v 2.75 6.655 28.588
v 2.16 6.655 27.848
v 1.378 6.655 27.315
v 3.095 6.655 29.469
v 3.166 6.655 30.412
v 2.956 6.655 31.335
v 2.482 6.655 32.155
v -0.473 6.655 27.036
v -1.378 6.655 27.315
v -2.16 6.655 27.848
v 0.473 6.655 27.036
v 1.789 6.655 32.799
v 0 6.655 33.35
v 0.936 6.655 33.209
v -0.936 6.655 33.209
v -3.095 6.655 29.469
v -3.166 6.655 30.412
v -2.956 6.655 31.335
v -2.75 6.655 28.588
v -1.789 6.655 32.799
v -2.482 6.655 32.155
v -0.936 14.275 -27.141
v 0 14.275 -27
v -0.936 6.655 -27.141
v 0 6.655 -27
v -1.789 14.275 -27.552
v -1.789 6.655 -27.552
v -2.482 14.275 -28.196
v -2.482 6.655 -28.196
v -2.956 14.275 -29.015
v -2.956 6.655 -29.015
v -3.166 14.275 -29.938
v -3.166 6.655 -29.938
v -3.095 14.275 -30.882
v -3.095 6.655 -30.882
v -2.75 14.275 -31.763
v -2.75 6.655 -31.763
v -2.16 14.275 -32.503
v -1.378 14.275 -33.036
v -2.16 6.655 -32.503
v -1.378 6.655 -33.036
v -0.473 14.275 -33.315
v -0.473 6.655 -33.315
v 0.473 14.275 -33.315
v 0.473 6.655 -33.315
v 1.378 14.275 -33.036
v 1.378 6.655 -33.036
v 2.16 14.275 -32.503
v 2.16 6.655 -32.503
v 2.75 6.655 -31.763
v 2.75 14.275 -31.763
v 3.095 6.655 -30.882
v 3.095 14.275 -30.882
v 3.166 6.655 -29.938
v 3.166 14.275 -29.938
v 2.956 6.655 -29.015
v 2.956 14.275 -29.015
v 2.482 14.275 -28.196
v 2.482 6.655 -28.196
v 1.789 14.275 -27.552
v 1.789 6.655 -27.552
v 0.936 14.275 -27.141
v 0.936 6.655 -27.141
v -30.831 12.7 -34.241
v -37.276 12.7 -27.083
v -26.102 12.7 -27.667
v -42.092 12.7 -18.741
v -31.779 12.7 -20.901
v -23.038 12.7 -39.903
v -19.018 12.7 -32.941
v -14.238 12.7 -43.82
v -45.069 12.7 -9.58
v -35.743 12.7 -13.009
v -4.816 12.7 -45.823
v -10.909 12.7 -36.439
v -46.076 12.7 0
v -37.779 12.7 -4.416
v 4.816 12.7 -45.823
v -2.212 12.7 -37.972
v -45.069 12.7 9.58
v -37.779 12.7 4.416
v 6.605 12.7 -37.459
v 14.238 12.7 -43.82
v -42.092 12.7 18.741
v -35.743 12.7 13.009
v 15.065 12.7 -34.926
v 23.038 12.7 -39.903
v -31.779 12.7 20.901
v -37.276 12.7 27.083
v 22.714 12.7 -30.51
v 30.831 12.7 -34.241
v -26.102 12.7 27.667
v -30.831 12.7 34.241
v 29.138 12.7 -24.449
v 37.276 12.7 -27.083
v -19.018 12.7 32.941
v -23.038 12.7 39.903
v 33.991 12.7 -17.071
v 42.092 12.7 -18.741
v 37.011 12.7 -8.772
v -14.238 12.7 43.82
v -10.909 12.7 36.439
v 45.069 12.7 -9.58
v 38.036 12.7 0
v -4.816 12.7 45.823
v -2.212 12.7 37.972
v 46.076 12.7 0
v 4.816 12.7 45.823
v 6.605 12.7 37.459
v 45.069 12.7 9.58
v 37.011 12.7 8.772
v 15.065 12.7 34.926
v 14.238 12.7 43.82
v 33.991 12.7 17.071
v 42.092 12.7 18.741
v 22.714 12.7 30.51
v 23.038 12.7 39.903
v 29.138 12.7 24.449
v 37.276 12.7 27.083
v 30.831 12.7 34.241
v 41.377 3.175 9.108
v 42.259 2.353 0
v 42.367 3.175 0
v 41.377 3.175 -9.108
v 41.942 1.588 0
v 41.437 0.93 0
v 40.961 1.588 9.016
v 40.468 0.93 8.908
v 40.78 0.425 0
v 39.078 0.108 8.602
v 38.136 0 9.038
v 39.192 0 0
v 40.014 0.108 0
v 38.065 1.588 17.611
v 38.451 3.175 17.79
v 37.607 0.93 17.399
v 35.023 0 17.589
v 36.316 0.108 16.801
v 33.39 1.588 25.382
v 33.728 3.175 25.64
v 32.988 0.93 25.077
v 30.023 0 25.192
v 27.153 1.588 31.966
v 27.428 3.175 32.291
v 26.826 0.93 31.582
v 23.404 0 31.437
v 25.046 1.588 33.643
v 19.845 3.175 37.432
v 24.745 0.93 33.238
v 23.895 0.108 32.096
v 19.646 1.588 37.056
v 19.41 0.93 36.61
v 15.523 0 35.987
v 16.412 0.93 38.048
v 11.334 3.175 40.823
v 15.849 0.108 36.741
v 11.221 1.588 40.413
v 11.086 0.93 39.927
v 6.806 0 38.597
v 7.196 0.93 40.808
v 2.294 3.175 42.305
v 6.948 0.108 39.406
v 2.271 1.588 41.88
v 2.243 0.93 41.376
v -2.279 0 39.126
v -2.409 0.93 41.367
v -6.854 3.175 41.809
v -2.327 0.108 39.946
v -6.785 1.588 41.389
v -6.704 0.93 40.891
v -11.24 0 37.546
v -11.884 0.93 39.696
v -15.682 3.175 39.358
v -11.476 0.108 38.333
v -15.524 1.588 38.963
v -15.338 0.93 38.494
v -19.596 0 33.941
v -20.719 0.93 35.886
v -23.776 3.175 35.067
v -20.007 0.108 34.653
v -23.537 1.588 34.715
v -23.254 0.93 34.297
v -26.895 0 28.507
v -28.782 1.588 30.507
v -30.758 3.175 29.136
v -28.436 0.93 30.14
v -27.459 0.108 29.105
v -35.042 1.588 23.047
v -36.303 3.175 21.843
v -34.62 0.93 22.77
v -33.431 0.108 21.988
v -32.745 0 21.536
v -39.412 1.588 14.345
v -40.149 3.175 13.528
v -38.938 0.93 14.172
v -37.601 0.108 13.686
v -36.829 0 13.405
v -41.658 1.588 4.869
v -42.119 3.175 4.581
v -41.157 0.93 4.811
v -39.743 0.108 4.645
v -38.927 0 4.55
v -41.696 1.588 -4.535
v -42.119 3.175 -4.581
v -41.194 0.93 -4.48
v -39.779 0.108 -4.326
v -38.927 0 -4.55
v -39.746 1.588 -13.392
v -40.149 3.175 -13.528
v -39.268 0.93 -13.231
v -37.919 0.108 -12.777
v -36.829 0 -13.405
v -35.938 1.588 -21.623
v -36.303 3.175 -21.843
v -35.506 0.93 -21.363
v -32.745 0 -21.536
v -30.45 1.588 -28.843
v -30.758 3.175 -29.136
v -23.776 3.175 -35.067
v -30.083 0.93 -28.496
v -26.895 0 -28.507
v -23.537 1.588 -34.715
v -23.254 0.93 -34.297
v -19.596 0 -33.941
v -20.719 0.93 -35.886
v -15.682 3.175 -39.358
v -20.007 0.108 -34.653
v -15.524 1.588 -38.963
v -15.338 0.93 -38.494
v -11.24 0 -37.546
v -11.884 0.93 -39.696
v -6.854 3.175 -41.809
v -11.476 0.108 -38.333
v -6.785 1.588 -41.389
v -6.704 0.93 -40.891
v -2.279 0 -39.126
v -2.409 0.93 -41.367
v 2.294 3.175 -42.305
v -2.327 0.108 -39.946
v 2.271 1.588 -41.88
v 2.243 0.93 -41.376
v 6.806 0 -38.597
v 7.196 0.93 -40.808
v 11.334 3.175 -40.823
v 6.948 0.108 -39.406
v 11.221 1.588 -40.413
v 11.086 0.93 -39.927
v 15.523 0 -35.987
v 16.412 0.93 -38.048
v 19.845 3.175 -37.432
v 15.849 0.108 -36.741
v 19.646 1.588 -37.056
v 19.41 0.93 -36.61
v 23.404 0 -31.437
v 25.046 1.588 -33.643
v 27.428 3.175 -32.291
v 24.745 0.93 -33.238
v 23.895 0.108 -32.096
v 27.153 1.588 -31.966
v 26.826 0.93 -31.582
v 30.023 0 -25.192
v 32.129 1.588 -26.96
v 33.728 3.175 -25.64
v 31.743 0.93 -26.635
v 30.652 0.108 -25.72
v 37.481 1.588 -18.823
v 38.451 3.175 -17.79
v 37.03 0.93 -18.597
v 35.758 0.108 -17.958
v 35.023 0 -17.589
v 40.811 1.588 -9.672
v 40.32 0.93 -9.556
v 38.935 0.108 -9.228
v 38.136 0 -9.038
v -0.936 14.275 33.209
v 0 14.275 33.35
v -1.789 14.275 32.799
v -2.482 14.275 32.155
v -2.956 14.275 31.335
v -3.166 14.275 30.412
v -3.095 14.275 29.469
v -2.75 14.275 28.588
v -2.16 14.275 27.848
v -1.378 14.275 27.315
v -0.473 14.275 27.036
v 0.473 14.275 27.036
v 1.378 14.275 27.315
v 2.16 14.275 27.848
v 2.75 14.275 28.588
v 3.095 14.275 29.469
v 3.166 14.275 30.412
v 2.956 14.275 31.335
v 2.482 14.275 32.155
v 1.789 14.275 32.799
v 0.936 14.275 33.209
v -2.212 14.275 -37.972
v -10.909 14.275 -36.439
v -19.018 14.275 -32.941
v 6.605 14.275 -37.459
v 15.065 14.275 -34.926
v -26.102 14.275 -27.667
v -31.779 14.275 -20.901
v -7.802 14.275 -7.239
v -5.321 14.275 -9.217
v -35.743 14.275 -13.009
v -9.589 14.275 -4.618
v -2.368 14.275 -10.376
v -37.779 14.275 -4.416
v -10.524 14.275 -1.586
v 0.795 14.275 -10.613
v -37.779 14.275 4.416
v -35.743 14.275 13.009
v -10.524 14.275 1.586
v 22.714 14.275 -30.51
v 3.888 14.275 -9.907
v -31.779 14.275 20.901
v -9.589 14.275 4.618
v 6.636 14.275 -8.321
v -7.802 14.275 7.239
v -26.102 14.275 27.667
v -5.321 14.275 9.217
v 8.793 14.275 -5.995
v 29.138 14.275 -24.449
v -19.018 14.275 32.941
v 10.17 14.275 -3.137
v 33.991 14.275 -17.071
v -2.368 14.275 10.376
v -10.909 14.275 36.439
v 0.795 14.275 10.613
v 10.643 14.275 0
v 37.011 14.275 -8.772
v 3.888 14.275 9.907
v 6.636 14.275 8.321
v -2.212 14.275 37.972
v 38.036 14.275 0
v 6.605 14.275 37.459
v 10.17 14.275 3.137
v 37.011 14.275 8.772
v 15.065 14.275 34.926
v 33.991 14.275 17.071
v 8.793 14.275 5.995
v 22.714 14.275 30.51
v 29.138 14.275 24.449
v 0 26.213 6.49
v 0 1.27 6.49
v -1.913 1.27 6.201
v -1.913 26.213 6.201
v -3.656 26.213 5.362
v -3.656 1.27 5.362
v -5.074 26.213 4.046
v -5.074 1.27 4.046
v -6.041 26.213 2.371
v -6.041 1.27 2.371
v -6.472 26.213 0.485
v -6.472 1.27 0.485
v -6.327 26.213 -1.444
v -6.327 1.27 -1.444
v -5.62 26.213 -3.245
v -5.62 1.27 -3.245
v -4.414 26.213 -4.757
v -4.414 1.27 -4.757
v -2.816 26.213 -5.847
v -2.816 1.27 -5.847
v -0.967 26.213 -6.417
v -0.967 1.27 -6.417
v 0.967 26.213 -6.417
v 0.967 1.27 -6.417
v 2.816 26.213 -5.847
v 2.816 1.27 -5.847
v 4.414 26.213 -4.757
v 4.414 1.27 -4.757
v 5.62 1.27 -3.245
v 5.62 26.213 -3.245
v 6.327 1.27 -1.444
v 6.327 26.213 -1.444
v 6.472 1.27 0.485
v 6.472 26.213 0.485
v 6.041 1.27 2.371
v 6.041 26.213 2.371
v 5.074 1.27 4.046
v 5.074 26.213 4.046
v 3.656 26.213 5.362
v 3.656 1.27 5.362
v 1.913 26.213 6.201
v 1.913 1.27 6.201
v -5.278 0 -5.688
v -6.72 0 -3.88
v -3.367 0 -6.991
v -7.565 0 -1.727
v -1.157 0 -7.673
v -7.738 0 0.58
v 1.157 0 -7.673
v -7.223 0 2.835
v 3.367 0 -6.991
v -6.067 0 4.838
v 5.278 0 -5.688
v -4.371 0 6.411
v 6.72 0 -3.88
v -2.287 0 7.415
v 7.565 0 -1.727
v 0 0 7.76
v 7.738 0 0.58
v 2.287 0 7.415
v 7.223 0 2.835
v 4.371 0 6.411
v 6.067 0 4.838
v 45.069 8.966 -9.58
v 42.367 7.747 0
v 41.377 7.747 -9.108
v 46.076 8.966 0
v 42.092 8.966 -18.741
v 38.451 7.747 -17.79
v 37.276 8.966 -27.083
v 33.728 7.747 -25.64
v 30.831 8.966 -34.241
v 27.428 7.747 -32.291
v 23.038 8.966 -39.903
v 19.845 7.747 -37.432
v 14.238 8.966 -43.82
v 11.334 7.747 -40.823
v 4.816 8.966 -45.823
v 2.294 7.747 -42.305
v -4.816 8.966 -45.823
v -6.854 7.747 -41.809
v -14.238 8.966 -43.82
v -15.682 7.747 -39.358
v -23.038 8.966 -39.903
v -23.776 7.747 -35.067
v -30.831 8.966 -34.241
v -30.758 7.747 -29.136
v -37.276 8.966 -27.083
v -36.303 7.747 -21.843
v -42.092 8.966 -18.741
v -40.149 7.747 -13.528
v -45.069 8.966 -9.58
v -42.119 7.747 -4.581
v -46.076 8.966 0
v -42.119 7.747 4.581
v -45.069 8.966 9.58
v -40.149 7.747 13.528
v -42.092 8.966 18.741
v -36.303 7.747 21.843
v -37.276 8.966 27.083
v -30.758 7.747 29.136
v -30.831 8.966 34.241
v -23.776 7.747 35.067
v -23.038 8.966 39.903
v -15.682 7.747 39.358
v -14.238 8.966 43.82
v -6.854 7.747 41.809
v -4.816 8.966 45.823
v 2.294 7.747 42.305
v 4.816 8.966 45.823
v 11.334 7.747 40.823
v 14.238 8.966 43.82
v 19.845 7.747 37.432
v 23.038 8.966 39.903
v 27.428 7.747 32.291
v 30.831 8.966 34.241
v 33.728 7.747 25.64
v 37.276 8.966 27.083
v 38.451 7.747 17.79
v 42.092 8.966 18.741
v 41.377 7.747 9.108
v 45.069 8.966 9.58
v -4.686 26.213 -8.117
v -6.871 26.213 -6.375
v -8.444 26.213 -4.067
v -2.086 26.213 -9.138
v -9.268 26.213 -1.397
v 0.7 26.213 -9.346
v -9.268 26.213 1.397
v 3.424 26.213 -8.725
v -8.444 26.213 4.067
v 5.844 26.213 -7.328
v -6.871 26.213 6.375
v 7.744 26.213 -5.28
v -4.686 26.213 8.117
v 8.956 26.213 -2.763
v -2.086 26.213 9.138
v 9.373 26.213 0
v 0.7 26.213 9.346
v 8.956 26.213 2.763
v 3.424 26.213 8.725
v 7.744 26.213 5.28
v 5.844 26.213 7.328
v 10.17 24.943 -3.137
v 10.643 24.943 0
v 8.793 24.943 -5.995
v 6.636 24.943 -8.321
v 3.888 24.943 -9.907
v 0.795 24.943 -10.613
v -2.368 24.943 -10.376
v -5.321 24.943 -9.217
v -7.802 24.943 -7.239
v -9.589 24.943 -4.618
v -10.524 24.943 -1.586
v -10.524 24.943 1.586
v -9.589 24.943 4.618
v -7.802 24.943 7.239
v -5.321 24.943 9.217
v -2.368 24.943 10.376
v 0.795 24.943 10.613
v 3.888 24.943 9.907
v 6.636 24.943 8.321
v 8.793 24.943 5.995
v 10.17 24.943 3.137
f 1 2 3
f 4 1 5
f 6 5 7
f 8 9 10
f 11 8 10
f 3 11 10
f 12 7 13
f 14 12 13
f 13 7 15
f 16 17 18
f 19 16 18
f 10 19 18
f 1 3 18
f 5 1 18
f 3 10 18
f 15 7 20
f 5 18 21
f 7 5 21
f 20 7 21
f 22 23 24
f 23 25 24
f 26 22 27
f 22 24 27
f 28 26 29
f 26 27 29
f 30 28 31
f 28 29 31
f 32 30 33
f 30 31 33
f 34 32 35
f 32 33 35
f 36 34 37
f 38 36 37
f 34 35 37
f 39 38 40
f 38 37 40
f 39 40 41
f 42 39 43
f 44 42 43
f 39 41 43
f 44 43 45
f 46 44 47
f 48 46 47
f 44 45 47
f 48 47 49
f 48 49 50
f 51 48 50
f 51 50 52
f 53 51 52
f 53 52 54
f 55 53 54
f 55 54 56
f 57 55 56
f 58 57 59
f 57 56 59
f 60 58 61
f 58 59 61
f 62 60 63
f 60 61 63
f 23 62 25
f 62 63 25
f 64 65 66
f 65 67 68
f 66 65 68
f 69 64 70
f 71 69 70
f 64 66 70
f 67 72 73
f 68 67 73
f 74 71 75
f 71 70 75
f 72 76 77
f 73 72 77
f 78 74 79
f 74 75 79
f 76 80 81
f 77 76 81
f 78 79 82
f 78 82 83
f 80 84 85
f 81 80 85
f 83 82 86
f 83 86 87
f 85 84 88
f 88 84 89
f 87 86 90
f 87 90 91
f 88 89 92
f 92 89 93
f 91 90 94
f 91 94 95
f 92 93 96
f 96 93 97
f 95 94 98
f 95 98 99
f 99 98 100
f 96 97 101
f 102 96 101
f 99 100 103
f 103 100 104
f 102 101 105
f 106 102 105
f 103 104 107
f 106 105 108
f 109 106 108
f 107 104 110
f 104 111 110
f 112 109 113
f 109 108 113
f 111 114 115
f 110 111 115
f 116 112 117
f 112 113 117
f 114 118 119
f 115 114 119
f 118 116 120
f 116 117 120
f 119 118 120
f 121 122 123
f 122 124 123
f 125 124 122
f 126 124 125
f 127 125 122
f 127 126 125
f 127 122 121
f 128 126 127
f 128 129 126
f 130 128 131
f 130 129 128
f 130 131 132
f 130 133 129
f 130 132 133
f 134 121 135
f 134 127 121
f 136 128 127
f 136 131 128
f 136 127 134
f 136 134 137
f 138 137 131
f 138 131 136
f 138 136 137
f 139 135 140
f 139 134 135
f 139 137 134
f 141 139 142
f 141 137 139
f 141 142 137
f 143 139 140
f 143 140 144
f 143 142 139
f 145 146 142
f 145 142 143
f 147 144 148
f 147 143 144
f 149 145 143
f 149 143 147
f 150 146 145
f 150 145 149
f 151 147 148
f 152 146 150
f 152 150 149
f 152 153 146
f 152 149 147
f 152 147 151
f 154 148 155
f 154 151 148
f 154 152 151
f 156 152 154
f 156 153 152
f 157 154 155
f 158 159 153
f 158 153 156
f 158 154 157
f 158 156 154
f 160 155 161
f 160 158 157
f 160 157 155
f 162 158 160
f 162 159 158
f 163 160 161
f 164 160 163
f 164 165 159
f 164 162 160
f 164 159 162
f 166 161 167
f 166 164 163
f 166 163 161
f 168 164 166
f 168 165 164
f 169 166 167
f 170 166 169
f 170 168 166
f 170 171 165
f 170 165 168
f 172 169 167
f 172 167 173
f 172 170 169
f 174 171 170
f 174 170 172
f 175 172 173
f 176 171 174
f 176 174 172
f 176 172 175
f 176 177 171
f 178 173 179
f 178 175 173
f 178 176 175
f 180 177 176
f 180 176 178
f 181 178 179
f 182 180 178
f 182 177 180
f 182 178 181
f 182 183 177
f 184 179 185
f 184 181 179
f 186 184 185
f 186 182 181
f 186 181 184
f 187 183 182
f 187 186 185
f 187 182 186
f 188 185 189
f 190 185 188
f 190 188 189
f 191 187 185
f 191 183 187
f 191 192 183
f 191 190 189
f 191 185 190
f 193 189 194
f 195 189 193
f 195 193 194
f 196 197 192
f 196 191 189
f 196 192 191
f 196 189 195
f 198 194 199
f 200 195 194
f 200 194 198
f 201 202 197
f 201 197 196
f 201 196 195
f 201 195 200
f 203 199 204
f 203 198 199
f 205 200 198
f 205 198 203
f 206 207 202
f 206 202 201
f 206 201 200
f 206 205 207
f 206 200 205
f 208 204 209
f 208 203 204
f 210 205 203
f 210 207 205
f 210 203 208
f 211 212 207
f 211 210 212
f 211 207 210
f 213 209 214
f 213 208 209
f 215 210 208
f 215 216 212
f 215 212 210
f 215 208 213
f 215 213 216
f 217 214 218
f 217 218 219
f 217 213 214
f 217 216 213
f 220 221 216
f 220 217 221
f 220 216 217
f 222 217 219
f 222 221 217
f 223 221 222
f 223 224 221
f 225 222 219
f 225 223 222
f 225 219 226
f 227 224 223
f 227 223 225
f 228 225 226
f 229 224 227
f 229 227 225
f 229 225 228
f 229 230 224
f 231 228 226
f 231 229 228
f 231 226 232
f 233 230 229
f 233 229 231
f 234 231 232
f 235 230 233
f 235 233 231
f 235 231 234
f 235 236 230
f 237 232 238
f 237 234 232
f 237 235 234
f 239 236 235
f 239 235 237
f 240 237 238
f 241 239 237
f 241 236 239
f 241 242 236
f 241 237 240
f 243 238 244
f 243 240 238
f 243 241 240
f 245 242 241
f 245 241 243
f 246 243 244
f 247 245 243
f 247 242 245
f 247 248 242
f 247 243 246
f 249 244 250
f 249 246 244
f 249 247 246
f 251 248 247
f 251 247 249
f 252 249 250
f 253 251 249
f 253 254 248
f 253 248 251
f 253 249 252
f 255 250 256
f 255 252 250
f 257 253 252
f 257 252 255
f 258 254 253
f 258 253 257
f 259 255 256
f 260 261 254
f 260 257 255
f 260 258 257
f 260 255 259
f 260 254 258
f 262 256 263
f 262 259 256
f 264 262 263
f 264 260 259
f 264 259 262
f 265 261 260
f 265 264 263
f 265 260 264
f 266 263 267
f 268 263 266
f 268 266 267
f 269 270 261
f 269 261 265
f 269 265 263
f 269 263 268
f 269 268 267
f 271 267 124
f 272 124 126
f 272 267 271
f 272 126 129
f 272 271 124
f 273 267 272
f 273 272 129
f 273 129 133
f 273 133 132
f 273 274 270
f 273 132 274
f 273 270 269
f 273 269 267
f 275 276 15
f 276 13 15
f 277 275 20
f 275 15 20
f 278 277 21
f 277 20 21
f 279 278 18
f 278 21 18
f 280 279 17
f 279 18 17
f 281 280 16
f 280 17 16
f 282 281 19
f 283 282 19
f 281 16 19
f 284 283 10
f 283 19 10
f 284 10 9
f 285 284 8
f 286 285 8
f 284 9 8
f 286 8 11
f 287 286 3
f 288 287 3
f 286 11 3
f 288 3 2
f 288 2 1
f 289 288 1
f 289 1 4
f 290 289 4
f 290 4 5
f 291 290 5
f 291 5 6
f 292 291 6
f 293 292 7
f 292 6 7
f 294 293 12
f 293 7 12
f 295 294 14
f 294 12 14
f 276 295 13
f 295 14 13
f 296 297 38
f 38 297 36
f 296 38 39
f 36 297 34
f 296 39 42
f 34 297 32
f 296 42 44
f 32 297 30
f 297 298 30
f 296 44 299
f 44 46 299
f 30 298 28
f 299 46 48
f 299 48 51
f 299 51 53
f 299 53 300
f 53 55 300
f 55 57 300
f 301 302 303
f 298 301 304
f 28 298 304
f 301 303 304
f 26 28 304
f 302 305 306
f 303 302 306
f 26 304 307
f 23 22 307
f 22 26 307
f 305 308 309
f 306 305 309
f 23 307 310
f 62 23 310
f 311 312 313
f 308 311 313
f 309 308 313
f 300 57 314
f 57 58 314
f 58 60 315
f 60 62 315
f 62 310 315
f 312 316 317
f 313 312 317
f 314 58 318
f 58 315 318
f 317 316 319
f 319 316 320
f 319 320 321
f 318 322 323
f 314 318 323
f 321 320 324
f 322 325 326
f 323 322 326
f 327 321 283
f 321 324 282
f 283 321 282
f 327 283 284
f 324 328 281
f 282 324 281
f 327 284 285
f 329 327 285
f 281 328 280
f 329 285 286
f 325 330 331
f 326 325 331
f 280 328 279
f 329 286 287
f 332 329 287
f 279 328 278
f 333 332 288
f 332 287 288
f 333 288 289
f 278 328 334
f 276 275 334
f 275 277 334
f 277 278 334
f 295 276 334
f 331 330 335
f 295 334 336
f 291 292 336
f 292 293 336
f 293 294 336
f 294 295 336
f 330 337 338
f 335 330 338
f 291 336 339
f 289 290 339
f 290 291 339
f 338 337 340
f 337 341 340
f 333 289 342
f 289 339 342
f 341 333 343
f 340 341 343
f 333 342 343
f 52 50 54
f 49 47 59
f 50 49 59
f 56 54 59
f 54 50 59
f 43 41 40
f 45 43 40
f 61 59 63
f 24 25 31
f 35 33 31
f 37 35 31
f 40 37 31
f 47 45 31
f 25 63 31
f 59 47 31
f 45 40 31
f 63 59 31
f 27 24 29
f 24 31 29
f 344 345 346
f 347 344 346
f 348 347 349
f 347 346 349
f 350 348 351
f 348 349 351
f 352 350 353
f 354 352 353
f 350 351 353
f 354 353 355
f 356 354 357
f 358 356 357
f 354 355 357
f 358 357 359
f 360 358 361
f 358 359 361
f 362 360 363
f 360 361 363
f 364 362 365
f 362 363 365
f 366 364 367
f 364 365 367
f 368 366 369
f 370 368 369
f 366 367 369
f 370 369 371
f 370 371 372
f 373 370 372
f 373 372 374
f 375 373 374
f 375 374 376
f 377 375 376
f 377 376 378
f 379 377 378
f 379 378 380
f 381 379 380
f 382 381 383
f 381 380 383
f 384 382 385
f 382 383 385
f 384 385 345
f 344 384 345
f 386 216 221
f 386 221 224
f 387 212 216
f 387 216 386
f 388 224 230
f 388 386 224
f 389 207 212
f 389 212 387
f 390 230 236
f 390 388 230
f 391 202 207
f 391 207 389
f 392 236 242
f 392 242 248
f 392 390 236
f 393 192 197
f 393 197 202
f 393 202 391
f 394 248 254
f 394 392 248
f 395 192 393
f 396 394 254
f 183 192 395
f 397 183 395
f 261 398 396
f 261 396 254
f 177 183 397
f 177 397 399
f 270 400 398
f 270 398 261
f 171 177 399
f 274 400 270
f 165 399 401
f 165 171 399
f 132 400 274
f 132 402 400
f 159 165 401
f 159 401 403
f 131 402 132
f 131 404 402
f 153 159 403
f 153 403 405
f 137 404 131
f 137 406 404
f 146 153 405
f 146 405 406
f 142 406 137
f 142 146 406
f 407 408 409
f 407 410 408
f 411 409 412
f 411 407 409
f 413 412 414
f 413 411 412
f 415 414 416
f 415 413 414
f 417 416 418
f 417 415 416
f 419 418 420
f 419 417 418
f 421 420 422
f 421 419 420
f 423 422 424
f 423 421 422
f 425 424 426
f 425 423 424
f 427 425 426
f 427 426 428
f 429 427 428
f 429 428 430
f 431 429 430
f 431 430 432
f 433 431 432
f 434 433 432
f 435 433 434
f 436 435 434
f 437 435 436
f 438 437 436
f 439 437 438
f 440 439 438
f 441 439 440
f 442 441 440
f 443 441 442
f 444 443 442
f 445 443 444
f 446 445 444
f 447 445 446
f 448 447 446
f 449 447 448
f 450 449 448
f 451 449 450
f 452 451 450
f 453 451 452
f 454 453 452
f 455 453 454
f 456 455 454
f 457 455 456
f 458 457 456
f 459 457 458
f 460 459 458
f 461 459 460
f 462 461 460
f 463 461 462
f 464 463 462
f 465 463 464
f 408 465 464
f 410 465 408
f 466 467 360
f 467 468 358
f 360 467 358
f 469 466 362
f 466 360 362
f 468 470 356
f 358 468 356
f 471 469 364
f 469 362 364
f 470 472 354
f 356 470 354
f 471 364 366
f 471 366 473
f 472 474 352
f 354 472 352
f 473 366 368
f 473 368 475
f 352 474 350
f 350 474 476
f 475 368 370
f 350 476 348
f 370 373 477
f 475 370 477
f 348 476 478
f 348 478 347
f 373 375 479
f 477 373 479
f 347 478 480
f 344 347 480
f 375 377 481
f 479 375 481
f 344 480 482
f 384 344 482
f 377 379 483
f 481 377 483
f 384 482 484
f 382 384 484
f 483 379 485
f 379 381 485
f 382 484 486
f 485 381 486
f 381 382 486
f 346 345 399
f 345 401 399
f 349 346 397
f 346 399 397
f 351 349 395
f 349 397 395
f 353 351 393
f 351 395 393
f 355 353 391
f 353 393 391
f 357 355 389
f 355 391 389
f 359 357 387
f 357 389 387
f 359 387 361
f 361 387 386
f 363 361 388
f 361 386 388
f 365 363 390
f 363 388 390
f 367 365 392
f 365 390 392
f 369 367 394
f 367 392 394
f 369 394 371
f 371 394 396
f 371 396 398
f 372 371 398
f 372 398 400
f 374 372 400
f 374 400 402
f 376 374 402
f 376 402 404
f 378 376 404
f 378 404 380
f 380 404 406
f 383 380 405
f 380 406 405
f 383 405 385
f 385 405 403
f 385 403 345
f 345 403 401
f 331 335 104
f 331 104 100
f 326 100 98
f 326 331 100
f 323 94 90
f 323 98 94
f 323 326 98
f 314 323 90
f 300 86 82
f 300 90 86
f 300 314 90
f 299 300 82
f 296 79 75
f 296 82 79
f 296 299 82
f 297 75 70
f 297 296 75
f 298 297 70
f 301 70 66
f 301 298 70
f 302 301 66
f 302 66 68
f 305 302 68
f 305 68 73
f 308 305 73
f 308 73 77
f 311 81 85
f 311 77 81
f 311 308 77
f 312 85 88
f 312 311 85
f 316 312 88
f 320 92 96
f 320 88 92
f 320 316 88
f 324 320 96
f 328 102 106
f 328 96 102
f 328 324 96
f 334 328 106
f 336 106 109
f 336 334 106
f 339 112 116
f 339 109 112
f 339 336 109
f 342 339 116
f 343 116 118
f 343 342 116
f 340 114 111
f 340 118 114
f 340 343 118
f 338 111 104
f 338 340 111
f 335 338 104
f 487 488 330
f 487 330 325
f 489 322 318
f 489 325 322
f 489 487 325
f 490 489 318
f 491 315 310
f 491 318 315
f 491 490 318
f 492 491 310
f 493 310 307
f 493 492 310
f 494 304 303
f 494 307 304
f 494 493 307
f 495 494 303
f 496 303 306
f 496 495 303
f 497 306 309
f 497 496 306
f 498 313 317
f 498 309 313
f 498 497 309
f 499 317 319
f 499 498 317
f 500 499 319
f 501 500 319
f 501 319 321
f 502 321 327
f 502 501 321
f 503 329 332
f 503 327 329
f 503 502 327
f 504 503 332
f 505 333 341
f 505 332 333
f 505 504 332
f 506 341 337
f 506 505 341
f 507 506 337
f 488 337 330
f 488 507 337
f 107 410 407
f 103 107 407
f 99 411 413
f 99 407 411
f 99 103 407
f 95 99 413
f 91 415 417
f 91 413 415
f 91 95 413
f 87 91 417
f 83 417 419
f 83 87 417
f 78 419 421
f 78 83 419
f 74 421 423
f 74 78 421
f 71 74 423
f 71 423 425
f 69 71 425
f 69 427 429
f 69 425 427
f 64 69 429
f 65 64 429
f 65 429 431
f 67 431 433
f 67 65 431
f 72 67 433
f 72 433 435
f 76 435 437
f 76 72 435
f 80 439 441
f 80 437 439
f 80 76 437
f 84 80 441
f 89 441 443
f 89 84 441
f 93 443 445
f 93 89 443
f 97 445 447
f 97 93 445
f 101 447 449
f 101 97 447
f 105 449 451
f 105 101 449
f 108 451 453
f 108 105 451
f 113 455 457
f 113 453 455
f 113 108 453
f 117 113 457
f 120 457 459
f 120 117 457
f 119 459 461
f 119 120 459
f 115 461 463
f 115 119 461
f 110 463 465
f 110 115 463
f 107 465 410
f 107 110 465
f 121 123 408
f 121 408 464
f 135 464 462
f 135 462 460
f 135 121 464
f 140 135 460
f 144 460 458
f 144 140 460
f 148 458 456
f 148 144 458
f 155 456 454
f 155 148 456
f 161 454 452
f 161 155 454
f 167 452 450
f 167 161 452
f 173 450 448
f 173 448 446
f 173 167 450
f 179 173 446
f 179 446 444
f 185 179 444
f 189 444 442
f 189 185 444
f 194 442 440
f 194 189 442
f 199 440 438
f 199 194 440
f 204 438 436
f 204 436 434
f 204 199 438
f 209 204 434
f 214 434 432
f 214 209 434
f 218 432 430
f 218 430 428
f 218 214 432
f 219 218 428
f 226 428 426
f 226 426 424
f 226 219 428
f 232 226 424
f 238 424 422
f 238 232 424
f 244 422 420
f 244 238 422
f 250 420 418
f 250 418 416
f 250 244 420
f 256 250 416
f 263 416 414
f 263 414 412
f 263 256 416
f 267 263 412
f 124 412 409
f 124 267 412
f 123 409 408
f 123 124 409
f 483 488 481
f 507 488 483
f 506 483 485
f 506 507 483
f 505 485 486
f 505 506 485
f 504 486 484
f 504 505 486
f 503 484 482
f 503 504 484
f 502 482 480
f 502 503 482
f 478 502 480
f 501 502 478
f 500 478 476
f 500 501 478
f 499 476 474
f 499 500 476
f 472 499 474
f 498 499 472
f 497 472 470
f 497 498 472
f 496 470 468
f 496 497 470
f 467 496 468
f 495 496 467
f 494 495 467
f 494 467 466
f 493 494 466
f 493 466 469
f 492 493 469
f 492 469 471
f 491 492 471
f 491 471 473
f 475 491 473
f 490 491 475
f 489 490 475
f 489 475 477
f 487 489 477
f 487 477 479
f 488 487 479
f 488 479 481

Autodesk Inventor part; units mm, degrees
ref_plane "YZ Plane" through (0, 0, 0) normal (1, 0, 0) x (0, 1, 0)
ref_plane "XZ Plane" through (0, 0, 0) normal (0, 1, 0) x (-1, 0, 0)
ref_plane "XY Plane" through (0, 0, 0) normal (0, 0, 1) x (1, 0, 0)
sketch "Sketch1" plane through (0, 0, 0) normal (0, 0, 1) x (1, 0, 0)
  line L0 (17.5514, 0) -> (46.0756, 0)
  line L1 (46.0756, 0) -> (46.0756, 12.7)
  line L2 (46.0756, 12.7) -> (0, 12.7)
  line L3 (0, 12.7) -> (0, 0)
  line L4 (17.5514, 12.7) -> (17.5514, 0)
  line L5 (46.0756, 8.9662) -> (42.3672, 8.9662)
  line L6 (42.3672, 7.747) -> (42.3672, 0)
  line L7 (46.0756, 7.747) -> (42.3672, 7.747)
  line L8 (46.0756, 8.9662) -> (42.3672, 7.747)
  line L9 (0, 11.1252) -> (0, 12.7)
  line L10 (17.5514, 0) -> (23.85, 0)
  line L11 (0, -2.5) -> (0, 0)
  line L12 (0, 12.7) -> (38.0365, 12.7)
  line L13 (38.0365, 12.7) -> (38.0365, 14.2748)
  line L14 (38.0365, 14.2748) -> (0, 14.2748)
  line L15 (0, 14.2748) -> (0, 12.7)
  line L16 (17.5514, 12.7) -> (17.5514, 14.2748)
  line L17 (0, 0) -> (17.5514, 0)
  line L18 (0, 14.2748) -> (10.6426, 14.2748)
  line L19 (10.6426, 14.2748) -> (10.6426, 26.2128)
  line L20 (10.6426, 26.2128) -> (0, 26.2128)
  line L21 (0, 26.2128) -> (0, 14.2748)
  dimension "d1" = 12.7
  dimension "d3" = 3.7338
  dimension "d5" = 4.953
  dimension "d8" = 17.5514
  dimension "d9" = 42.3672
  dimension "d10" = 46.0756
  dimension "d11" = 1.5748
  dimension "d12" = 38.0365
  dimension "d23" = 11.938
  dimension "d24" = 10.6426
revolve "Revolution1" add sketch "Sketch1" angle 360 about axis through (0, 12.7, 0) along (0, -1, 0) contours L4 L2 L1 L8 L6 L0 | L17 L3 L2 L4 | L16 L14 L13 L2 | L2 L15 L14 L16 | L21 L20 L19 L14
sketch "Sketch2" plane through (0, 14.2748, 0) normal (0, 1, 0) x (1, 0, 0)
  circle A0 centre (0, 0) radius 30.1752
  point P0 (0, 30.1752)
  point P1 (0, -30.1752)
  dimension "d14" = 60.3504
hole "Hole1" at (0, 14.2748, -30.1752) at (0, 14.2748, 30.1752) direction (0, -1, 0) diameter 6.35 depth 7.62
fillet "Fillet1" radius 3.175 1 edges at (-42.3672, 0, 0)
sketch "Sketch3" plane through (0, 26.2128, 0) normal (0, 1, 0) x (1, 0, 0)
  point P0 (0, 0)
  point P1 (0, 0)
hole "Hole2" at (0, 26.2128, 0) direction (0, -1, 0) diameter 12.9794 end through all
chamfer "Chamfer1" distance 1.27 angle 45 1 edges at (0, 0, -6.4897)
chamfer "Chamfer2" distance 1.27 angle 45 1 edges at (-10.6426, 26.2128, 0)
properties part number "2016.06.09 ThorLabs Photodiode Adapter" material "Aluminum 6061"
